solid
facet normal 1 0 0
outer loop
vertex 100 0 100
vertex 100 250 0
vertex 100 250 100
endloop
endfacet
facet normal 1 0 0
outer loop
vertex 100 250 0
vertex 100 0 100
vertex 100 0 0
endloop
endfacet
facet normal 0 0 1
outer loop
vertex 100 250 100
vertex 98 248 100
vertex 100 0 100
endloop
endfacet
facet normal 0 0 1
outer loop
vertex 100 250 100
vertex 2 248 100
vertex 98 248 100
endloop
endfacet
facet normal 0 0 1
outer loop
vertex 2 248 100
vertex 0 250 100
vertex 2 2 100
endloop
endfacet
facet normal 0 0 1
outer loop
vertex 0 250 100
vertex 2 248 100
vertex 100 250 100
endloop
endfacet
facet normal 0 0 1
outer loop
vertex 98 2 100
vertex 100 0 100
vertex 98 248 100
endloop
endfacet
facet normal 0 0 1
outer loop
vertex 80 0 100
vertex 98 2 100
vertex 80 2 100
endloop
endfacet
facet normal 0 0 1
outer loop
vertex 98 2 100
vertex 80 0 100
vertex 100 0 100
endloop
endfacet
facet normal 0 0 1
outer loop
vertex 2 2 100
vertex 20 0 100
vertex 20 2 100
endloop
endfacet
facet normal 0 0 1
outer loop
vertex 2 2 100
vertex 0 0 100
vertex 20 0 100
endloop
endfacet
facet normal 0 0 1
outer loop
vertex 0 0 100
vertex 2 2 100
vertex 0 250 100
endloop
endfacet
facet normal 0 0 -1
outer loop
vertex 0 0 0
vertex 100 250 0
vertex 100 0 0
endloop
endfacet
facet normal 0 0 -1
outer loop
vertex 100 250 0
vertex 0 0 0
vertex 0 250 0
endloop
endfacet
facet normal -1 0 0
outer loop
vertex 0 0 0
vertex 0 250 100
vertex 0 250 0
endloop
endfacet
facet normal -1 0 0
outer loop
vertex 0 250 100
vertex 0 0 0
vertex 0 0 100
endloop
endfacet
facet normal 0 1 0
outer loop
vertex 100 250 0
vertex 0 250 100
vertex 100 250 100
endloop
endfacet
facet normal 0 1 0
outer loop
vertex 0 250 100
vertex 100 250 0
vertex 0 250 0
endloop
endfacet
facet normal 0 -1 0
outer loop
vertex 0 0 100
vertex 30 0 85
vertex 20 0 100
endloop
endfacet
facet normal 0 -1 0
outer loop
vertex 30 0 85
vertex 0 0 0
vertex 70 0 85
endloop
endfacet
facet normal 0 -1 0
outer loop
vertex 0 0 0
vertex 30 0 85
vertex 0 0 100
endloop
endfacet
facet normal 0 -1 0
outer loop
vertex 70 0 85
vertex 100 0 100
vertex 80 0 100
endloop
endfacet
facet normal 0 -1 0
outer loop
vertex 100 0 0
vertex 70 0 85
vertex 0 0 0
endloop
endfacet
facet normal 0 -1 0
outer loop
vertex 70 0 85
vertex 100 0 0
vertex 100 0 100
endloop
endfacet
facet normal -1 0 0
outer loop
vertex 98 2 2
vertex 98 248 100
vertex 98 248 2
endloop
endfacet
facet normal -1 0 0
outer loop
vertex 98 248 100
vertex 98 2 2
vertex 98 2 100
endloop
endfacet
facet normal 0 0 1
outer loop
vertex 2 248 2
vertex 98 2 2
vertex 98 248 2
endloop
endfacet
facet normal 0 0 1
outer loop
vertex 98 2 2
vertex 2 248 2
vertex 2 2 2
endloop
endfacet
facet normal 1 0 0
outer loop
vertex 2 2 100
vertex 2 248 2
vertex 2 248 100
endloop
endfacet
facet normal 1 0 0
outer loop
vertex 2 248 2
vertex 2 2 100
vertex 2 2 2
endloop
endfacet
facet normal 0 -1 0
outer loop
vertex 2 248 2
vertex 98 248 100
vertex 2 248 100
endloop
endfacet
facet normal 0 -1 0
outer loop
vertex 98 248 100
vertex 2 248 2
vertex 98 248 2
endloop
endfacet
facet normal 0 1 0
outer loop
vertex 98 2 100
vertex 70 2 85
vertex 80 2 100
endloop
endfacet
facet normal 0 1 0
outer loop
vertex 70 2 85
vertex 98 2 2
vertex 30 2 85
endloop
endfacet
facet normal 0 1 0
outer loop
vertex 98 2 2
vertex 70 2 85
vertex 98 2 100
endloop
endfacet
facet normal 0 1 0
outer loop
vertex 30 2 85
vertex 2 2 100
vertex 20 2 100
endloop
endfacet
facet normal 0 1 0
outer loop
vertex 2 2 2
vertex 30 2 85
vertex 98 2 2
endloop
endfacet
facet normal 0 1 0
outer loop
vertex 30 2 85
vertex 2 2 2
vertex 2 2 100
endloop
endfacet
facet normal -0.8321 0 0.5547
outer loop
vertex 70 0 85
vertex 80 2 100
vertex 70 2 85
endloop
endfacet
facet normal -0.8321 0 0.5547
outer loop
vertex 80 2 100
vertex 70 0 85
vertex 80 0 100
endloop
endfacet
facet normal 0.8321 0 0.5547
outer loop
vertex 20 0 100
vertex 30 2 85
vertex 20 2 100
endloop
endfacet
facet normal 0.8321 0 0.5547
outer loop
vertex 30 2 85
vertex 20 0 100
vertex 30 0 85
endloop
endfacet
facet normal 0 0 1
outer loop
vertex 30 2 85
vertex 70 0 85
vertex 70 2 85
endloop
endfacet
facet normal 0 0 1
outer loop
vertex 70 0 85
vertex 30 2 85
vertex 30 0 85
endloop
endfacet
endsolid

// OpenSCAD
// Kallas Box - open top box
// Front: 100mm x 100mm, Depth: 250mm
// Open on top (along the 250mm length)

wall = 2; // wall thickness

width = 100;
height = 100;
depth = 250;

// Finger cutout parameters (on front 100x100 wall)
cutout_top_width = 60;    // width at the top edge
cutout_bottom_width = 40; // width at the bottom of the cutout
cutout_depth = 15;        // how far down from the top

difference() {
    cube([width, depth, height]);

    // Hollow interior (open top)
    translate([wall, wall, wall])
        cube([width - 2 * wall, depth - 2 * wall, height]);

    // Finger cutout - trapezoid on front wall (y=0 face)
    // Extrude through the wall along Y axis
    translate([width / 2, -1, 0])
        rotate([-90, 0, 0])
            linear_extrude(height = wall + 2)
                polygon([
                    [-cutout_top_width / 2, -(height)],
                    [cutout_top_width / 2, -(height)],
                    [cutout_bottom_width / 2, -(height - cutout_depth)],
                    [-cutout_bottom_width / 2, -(height - cutout_depth)]
                ]);
}
